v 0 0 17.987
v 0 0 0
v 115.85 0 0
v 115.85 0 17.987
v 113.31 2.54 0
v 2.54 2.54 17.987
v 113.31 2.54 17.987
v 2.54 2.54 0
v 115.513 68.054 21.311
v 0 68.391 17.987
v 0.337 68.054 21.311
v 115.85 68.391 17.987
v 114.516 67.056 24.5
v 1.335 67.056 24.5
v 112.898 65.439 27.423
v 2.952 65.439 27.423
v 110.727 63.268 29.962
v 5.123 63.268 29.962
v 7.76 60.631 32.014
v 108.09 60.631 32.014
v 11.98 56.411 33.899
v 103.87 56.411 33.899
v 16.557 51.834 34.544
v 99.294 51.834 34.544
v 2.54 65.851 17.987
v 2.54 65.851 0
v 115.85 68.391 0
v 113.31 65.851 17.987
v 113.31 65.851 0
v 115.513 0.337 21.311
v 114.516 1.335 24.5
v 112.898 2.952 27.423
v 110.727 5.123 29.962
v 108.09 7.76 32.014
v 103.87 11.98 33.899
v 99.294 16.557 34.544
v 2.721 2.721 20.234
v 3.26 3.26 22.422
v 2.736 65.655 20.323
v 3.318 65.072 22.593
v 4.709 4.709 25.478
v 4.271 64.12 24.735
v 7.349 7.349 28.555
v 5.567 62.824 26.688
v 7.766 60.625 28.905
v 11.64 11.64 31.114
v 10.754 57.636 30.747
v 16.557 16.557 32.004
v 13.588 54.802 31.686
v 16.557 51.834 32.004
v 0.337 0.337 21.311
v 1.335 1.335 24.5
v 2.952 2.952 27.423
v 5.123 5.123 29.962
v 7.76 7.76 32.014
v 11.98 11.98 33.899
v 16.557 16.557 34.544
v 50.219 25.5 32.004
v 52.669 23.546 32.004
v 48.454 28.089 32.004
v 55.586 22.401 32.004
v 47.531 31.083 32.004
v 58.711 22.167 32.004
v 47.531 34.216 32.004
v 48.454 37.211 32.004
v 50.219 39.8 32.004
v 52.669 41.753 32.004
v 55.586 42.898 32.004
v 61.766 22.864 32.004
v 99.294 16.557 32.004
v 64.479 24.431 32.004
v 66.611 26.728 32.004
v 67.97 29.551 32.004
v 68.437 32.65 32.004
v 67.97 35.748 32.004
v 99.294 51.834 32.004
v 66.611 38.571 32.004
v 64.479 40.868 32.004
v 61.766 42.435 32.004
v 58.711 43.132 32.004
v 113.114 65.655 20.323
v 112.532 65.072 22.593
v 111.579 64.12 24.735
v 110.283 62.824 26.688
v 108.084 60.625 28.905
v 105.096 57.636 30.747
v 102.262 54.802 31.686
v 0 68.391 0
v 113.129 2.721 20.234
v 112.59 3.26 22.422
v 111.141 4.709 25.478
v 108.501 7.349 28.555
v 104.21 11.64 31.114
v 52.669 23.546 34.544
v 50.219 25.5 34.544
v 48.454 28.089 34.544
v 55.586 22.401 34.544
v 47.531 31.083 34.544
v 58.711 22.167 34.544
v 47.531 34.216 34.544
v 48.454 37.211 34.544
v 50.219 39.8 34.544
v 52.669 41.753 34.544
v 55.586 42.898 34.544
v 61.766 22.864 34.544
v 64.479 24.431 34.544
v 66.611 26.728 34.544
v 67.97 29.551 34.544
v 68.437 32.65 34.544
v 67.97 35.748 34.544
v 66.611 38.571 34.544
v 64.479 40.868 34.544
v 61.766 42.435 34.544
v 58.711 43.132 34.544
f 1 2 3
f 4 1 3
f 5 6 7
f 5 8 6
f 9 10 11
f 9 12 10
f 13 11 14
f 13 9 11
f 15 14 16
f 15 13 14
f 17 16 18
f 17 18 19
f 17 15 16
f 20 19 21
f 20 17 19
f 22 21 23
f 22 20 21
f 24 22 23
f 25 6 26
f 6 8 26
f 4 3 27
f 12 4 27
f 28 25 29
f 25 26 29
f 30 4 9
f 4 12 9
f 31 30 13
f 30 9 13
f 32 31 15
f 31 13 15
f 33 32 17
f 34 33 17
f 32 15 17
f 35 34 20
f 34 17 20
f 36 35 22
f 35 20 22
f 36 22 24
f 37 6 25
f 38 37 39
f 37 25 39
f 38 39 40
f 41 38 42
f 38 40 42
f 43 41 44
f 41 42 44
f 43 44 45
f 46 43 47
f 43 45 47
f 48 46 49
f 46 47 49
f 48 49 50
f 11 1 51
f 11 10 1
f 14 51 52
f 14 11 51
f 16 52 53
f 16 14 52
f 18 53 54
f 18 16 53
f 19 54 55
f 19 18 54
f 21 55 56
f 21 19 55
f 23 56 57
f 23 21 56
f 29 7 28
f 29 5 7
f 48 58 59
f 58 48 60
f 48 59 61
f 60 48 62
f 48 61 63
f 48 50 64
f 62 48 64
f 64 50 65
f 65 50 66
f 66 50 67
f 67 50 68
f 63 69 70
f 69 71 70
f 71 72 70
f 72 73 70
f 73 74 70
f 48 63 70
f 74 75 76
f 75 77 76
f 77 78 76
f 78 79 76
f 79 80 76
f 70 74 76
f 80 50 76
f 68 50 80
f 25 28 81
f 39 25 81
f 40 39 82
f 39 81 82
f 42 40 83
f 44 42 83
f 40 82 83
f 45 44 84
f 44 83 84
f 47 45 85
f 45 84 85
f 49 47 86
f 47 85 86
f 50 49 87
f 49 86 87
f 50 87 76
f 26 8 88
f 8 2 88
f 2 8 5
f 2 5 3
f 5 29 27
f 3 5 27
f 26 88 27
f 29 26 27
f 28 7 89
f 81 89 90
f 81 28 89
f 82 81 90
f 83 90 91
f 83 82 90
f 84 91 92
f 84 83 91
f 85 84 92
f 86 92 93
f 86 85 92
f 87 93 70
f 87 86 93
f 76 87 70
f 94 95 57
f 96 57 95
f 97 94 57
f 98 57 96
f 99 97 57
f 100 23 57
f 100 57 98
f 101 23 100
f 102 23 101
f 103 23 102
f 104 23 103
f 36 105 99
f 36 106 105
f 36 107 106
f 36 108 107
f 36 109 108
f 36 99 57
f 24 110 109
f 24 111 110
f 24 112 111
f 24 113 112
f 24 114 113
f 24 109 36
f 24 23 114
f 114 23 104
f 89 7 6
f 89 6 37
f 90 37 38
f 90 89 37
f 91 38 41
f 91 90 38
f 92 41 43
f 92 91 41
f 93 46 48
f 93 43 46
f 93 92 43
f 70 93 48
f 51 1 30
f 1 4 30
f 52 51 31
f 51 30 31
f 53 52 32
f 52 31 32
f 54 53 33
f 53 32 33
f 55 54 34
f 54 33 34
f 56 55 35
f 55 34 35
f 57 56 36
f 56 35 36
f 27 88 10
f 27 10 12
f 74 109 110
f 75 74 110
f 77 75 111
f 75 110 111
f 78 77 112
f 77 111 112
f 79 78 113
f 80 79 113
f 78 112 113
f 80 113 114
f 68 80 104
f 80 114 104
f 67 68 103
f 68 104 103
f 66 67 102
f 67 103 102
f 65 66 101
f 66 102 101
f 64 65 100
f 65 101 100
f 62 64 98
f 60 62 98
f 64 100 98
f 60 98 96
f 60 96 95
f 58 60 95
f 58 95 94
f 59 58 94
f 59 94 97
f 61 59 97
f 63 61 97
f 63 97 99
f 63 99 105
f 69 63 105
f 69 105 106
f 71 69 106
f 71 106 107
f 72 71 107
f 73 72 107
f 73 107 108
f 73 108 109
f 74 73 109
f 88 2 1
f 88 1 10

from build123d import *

# Parameters (mm, degrees)
F0_W     = 115.850285
F0_H     = 68.390653
F1_DEPTH = 34.544
F2_R     = 16.556677
F3_T     = -2.54
F4_R     = 10.511937
F5_DEPTH = 25.4


with BuildPart() as f1:
    # F0 (on Top) → F1 (new body)
    with BuildSketch(Plane.XY):
        with Locations((57.925142, 34.195327)):
            Rectangle(F0_W, F0_H)
    extrude(amount=F1_DEPTH)

    # F2
    f2_edges = [f1.edges().sort_by_distance(p)[0] for p in [
        (0, 34.195326, 34.544),
        (57.925142, 0, 34.544),
        (115.850285, 34.195326, 34.544),
        (57.925142, 68.390653, 34.544),
    ]]
    fillet(f2_edges, radius=F2_R)

    # F3
    f3_openings = [f1.faces().sort_by_distance(p)[0] for p in [
        (57.925142, 34.195326, 0),
    ]]
    offset(amount=F3_T, openings=f3_openings)

    # F4 (on face) → F5 (cut)
    with BuildSketch(Plane.XY.offset(34.544)):
        with Locations((57.925142, 32.649688)):
            Circle(F4_R)
    extrude(amount=-F5_DEPTH, mode=Mode.SUBTRACT)


solid = f1.part
